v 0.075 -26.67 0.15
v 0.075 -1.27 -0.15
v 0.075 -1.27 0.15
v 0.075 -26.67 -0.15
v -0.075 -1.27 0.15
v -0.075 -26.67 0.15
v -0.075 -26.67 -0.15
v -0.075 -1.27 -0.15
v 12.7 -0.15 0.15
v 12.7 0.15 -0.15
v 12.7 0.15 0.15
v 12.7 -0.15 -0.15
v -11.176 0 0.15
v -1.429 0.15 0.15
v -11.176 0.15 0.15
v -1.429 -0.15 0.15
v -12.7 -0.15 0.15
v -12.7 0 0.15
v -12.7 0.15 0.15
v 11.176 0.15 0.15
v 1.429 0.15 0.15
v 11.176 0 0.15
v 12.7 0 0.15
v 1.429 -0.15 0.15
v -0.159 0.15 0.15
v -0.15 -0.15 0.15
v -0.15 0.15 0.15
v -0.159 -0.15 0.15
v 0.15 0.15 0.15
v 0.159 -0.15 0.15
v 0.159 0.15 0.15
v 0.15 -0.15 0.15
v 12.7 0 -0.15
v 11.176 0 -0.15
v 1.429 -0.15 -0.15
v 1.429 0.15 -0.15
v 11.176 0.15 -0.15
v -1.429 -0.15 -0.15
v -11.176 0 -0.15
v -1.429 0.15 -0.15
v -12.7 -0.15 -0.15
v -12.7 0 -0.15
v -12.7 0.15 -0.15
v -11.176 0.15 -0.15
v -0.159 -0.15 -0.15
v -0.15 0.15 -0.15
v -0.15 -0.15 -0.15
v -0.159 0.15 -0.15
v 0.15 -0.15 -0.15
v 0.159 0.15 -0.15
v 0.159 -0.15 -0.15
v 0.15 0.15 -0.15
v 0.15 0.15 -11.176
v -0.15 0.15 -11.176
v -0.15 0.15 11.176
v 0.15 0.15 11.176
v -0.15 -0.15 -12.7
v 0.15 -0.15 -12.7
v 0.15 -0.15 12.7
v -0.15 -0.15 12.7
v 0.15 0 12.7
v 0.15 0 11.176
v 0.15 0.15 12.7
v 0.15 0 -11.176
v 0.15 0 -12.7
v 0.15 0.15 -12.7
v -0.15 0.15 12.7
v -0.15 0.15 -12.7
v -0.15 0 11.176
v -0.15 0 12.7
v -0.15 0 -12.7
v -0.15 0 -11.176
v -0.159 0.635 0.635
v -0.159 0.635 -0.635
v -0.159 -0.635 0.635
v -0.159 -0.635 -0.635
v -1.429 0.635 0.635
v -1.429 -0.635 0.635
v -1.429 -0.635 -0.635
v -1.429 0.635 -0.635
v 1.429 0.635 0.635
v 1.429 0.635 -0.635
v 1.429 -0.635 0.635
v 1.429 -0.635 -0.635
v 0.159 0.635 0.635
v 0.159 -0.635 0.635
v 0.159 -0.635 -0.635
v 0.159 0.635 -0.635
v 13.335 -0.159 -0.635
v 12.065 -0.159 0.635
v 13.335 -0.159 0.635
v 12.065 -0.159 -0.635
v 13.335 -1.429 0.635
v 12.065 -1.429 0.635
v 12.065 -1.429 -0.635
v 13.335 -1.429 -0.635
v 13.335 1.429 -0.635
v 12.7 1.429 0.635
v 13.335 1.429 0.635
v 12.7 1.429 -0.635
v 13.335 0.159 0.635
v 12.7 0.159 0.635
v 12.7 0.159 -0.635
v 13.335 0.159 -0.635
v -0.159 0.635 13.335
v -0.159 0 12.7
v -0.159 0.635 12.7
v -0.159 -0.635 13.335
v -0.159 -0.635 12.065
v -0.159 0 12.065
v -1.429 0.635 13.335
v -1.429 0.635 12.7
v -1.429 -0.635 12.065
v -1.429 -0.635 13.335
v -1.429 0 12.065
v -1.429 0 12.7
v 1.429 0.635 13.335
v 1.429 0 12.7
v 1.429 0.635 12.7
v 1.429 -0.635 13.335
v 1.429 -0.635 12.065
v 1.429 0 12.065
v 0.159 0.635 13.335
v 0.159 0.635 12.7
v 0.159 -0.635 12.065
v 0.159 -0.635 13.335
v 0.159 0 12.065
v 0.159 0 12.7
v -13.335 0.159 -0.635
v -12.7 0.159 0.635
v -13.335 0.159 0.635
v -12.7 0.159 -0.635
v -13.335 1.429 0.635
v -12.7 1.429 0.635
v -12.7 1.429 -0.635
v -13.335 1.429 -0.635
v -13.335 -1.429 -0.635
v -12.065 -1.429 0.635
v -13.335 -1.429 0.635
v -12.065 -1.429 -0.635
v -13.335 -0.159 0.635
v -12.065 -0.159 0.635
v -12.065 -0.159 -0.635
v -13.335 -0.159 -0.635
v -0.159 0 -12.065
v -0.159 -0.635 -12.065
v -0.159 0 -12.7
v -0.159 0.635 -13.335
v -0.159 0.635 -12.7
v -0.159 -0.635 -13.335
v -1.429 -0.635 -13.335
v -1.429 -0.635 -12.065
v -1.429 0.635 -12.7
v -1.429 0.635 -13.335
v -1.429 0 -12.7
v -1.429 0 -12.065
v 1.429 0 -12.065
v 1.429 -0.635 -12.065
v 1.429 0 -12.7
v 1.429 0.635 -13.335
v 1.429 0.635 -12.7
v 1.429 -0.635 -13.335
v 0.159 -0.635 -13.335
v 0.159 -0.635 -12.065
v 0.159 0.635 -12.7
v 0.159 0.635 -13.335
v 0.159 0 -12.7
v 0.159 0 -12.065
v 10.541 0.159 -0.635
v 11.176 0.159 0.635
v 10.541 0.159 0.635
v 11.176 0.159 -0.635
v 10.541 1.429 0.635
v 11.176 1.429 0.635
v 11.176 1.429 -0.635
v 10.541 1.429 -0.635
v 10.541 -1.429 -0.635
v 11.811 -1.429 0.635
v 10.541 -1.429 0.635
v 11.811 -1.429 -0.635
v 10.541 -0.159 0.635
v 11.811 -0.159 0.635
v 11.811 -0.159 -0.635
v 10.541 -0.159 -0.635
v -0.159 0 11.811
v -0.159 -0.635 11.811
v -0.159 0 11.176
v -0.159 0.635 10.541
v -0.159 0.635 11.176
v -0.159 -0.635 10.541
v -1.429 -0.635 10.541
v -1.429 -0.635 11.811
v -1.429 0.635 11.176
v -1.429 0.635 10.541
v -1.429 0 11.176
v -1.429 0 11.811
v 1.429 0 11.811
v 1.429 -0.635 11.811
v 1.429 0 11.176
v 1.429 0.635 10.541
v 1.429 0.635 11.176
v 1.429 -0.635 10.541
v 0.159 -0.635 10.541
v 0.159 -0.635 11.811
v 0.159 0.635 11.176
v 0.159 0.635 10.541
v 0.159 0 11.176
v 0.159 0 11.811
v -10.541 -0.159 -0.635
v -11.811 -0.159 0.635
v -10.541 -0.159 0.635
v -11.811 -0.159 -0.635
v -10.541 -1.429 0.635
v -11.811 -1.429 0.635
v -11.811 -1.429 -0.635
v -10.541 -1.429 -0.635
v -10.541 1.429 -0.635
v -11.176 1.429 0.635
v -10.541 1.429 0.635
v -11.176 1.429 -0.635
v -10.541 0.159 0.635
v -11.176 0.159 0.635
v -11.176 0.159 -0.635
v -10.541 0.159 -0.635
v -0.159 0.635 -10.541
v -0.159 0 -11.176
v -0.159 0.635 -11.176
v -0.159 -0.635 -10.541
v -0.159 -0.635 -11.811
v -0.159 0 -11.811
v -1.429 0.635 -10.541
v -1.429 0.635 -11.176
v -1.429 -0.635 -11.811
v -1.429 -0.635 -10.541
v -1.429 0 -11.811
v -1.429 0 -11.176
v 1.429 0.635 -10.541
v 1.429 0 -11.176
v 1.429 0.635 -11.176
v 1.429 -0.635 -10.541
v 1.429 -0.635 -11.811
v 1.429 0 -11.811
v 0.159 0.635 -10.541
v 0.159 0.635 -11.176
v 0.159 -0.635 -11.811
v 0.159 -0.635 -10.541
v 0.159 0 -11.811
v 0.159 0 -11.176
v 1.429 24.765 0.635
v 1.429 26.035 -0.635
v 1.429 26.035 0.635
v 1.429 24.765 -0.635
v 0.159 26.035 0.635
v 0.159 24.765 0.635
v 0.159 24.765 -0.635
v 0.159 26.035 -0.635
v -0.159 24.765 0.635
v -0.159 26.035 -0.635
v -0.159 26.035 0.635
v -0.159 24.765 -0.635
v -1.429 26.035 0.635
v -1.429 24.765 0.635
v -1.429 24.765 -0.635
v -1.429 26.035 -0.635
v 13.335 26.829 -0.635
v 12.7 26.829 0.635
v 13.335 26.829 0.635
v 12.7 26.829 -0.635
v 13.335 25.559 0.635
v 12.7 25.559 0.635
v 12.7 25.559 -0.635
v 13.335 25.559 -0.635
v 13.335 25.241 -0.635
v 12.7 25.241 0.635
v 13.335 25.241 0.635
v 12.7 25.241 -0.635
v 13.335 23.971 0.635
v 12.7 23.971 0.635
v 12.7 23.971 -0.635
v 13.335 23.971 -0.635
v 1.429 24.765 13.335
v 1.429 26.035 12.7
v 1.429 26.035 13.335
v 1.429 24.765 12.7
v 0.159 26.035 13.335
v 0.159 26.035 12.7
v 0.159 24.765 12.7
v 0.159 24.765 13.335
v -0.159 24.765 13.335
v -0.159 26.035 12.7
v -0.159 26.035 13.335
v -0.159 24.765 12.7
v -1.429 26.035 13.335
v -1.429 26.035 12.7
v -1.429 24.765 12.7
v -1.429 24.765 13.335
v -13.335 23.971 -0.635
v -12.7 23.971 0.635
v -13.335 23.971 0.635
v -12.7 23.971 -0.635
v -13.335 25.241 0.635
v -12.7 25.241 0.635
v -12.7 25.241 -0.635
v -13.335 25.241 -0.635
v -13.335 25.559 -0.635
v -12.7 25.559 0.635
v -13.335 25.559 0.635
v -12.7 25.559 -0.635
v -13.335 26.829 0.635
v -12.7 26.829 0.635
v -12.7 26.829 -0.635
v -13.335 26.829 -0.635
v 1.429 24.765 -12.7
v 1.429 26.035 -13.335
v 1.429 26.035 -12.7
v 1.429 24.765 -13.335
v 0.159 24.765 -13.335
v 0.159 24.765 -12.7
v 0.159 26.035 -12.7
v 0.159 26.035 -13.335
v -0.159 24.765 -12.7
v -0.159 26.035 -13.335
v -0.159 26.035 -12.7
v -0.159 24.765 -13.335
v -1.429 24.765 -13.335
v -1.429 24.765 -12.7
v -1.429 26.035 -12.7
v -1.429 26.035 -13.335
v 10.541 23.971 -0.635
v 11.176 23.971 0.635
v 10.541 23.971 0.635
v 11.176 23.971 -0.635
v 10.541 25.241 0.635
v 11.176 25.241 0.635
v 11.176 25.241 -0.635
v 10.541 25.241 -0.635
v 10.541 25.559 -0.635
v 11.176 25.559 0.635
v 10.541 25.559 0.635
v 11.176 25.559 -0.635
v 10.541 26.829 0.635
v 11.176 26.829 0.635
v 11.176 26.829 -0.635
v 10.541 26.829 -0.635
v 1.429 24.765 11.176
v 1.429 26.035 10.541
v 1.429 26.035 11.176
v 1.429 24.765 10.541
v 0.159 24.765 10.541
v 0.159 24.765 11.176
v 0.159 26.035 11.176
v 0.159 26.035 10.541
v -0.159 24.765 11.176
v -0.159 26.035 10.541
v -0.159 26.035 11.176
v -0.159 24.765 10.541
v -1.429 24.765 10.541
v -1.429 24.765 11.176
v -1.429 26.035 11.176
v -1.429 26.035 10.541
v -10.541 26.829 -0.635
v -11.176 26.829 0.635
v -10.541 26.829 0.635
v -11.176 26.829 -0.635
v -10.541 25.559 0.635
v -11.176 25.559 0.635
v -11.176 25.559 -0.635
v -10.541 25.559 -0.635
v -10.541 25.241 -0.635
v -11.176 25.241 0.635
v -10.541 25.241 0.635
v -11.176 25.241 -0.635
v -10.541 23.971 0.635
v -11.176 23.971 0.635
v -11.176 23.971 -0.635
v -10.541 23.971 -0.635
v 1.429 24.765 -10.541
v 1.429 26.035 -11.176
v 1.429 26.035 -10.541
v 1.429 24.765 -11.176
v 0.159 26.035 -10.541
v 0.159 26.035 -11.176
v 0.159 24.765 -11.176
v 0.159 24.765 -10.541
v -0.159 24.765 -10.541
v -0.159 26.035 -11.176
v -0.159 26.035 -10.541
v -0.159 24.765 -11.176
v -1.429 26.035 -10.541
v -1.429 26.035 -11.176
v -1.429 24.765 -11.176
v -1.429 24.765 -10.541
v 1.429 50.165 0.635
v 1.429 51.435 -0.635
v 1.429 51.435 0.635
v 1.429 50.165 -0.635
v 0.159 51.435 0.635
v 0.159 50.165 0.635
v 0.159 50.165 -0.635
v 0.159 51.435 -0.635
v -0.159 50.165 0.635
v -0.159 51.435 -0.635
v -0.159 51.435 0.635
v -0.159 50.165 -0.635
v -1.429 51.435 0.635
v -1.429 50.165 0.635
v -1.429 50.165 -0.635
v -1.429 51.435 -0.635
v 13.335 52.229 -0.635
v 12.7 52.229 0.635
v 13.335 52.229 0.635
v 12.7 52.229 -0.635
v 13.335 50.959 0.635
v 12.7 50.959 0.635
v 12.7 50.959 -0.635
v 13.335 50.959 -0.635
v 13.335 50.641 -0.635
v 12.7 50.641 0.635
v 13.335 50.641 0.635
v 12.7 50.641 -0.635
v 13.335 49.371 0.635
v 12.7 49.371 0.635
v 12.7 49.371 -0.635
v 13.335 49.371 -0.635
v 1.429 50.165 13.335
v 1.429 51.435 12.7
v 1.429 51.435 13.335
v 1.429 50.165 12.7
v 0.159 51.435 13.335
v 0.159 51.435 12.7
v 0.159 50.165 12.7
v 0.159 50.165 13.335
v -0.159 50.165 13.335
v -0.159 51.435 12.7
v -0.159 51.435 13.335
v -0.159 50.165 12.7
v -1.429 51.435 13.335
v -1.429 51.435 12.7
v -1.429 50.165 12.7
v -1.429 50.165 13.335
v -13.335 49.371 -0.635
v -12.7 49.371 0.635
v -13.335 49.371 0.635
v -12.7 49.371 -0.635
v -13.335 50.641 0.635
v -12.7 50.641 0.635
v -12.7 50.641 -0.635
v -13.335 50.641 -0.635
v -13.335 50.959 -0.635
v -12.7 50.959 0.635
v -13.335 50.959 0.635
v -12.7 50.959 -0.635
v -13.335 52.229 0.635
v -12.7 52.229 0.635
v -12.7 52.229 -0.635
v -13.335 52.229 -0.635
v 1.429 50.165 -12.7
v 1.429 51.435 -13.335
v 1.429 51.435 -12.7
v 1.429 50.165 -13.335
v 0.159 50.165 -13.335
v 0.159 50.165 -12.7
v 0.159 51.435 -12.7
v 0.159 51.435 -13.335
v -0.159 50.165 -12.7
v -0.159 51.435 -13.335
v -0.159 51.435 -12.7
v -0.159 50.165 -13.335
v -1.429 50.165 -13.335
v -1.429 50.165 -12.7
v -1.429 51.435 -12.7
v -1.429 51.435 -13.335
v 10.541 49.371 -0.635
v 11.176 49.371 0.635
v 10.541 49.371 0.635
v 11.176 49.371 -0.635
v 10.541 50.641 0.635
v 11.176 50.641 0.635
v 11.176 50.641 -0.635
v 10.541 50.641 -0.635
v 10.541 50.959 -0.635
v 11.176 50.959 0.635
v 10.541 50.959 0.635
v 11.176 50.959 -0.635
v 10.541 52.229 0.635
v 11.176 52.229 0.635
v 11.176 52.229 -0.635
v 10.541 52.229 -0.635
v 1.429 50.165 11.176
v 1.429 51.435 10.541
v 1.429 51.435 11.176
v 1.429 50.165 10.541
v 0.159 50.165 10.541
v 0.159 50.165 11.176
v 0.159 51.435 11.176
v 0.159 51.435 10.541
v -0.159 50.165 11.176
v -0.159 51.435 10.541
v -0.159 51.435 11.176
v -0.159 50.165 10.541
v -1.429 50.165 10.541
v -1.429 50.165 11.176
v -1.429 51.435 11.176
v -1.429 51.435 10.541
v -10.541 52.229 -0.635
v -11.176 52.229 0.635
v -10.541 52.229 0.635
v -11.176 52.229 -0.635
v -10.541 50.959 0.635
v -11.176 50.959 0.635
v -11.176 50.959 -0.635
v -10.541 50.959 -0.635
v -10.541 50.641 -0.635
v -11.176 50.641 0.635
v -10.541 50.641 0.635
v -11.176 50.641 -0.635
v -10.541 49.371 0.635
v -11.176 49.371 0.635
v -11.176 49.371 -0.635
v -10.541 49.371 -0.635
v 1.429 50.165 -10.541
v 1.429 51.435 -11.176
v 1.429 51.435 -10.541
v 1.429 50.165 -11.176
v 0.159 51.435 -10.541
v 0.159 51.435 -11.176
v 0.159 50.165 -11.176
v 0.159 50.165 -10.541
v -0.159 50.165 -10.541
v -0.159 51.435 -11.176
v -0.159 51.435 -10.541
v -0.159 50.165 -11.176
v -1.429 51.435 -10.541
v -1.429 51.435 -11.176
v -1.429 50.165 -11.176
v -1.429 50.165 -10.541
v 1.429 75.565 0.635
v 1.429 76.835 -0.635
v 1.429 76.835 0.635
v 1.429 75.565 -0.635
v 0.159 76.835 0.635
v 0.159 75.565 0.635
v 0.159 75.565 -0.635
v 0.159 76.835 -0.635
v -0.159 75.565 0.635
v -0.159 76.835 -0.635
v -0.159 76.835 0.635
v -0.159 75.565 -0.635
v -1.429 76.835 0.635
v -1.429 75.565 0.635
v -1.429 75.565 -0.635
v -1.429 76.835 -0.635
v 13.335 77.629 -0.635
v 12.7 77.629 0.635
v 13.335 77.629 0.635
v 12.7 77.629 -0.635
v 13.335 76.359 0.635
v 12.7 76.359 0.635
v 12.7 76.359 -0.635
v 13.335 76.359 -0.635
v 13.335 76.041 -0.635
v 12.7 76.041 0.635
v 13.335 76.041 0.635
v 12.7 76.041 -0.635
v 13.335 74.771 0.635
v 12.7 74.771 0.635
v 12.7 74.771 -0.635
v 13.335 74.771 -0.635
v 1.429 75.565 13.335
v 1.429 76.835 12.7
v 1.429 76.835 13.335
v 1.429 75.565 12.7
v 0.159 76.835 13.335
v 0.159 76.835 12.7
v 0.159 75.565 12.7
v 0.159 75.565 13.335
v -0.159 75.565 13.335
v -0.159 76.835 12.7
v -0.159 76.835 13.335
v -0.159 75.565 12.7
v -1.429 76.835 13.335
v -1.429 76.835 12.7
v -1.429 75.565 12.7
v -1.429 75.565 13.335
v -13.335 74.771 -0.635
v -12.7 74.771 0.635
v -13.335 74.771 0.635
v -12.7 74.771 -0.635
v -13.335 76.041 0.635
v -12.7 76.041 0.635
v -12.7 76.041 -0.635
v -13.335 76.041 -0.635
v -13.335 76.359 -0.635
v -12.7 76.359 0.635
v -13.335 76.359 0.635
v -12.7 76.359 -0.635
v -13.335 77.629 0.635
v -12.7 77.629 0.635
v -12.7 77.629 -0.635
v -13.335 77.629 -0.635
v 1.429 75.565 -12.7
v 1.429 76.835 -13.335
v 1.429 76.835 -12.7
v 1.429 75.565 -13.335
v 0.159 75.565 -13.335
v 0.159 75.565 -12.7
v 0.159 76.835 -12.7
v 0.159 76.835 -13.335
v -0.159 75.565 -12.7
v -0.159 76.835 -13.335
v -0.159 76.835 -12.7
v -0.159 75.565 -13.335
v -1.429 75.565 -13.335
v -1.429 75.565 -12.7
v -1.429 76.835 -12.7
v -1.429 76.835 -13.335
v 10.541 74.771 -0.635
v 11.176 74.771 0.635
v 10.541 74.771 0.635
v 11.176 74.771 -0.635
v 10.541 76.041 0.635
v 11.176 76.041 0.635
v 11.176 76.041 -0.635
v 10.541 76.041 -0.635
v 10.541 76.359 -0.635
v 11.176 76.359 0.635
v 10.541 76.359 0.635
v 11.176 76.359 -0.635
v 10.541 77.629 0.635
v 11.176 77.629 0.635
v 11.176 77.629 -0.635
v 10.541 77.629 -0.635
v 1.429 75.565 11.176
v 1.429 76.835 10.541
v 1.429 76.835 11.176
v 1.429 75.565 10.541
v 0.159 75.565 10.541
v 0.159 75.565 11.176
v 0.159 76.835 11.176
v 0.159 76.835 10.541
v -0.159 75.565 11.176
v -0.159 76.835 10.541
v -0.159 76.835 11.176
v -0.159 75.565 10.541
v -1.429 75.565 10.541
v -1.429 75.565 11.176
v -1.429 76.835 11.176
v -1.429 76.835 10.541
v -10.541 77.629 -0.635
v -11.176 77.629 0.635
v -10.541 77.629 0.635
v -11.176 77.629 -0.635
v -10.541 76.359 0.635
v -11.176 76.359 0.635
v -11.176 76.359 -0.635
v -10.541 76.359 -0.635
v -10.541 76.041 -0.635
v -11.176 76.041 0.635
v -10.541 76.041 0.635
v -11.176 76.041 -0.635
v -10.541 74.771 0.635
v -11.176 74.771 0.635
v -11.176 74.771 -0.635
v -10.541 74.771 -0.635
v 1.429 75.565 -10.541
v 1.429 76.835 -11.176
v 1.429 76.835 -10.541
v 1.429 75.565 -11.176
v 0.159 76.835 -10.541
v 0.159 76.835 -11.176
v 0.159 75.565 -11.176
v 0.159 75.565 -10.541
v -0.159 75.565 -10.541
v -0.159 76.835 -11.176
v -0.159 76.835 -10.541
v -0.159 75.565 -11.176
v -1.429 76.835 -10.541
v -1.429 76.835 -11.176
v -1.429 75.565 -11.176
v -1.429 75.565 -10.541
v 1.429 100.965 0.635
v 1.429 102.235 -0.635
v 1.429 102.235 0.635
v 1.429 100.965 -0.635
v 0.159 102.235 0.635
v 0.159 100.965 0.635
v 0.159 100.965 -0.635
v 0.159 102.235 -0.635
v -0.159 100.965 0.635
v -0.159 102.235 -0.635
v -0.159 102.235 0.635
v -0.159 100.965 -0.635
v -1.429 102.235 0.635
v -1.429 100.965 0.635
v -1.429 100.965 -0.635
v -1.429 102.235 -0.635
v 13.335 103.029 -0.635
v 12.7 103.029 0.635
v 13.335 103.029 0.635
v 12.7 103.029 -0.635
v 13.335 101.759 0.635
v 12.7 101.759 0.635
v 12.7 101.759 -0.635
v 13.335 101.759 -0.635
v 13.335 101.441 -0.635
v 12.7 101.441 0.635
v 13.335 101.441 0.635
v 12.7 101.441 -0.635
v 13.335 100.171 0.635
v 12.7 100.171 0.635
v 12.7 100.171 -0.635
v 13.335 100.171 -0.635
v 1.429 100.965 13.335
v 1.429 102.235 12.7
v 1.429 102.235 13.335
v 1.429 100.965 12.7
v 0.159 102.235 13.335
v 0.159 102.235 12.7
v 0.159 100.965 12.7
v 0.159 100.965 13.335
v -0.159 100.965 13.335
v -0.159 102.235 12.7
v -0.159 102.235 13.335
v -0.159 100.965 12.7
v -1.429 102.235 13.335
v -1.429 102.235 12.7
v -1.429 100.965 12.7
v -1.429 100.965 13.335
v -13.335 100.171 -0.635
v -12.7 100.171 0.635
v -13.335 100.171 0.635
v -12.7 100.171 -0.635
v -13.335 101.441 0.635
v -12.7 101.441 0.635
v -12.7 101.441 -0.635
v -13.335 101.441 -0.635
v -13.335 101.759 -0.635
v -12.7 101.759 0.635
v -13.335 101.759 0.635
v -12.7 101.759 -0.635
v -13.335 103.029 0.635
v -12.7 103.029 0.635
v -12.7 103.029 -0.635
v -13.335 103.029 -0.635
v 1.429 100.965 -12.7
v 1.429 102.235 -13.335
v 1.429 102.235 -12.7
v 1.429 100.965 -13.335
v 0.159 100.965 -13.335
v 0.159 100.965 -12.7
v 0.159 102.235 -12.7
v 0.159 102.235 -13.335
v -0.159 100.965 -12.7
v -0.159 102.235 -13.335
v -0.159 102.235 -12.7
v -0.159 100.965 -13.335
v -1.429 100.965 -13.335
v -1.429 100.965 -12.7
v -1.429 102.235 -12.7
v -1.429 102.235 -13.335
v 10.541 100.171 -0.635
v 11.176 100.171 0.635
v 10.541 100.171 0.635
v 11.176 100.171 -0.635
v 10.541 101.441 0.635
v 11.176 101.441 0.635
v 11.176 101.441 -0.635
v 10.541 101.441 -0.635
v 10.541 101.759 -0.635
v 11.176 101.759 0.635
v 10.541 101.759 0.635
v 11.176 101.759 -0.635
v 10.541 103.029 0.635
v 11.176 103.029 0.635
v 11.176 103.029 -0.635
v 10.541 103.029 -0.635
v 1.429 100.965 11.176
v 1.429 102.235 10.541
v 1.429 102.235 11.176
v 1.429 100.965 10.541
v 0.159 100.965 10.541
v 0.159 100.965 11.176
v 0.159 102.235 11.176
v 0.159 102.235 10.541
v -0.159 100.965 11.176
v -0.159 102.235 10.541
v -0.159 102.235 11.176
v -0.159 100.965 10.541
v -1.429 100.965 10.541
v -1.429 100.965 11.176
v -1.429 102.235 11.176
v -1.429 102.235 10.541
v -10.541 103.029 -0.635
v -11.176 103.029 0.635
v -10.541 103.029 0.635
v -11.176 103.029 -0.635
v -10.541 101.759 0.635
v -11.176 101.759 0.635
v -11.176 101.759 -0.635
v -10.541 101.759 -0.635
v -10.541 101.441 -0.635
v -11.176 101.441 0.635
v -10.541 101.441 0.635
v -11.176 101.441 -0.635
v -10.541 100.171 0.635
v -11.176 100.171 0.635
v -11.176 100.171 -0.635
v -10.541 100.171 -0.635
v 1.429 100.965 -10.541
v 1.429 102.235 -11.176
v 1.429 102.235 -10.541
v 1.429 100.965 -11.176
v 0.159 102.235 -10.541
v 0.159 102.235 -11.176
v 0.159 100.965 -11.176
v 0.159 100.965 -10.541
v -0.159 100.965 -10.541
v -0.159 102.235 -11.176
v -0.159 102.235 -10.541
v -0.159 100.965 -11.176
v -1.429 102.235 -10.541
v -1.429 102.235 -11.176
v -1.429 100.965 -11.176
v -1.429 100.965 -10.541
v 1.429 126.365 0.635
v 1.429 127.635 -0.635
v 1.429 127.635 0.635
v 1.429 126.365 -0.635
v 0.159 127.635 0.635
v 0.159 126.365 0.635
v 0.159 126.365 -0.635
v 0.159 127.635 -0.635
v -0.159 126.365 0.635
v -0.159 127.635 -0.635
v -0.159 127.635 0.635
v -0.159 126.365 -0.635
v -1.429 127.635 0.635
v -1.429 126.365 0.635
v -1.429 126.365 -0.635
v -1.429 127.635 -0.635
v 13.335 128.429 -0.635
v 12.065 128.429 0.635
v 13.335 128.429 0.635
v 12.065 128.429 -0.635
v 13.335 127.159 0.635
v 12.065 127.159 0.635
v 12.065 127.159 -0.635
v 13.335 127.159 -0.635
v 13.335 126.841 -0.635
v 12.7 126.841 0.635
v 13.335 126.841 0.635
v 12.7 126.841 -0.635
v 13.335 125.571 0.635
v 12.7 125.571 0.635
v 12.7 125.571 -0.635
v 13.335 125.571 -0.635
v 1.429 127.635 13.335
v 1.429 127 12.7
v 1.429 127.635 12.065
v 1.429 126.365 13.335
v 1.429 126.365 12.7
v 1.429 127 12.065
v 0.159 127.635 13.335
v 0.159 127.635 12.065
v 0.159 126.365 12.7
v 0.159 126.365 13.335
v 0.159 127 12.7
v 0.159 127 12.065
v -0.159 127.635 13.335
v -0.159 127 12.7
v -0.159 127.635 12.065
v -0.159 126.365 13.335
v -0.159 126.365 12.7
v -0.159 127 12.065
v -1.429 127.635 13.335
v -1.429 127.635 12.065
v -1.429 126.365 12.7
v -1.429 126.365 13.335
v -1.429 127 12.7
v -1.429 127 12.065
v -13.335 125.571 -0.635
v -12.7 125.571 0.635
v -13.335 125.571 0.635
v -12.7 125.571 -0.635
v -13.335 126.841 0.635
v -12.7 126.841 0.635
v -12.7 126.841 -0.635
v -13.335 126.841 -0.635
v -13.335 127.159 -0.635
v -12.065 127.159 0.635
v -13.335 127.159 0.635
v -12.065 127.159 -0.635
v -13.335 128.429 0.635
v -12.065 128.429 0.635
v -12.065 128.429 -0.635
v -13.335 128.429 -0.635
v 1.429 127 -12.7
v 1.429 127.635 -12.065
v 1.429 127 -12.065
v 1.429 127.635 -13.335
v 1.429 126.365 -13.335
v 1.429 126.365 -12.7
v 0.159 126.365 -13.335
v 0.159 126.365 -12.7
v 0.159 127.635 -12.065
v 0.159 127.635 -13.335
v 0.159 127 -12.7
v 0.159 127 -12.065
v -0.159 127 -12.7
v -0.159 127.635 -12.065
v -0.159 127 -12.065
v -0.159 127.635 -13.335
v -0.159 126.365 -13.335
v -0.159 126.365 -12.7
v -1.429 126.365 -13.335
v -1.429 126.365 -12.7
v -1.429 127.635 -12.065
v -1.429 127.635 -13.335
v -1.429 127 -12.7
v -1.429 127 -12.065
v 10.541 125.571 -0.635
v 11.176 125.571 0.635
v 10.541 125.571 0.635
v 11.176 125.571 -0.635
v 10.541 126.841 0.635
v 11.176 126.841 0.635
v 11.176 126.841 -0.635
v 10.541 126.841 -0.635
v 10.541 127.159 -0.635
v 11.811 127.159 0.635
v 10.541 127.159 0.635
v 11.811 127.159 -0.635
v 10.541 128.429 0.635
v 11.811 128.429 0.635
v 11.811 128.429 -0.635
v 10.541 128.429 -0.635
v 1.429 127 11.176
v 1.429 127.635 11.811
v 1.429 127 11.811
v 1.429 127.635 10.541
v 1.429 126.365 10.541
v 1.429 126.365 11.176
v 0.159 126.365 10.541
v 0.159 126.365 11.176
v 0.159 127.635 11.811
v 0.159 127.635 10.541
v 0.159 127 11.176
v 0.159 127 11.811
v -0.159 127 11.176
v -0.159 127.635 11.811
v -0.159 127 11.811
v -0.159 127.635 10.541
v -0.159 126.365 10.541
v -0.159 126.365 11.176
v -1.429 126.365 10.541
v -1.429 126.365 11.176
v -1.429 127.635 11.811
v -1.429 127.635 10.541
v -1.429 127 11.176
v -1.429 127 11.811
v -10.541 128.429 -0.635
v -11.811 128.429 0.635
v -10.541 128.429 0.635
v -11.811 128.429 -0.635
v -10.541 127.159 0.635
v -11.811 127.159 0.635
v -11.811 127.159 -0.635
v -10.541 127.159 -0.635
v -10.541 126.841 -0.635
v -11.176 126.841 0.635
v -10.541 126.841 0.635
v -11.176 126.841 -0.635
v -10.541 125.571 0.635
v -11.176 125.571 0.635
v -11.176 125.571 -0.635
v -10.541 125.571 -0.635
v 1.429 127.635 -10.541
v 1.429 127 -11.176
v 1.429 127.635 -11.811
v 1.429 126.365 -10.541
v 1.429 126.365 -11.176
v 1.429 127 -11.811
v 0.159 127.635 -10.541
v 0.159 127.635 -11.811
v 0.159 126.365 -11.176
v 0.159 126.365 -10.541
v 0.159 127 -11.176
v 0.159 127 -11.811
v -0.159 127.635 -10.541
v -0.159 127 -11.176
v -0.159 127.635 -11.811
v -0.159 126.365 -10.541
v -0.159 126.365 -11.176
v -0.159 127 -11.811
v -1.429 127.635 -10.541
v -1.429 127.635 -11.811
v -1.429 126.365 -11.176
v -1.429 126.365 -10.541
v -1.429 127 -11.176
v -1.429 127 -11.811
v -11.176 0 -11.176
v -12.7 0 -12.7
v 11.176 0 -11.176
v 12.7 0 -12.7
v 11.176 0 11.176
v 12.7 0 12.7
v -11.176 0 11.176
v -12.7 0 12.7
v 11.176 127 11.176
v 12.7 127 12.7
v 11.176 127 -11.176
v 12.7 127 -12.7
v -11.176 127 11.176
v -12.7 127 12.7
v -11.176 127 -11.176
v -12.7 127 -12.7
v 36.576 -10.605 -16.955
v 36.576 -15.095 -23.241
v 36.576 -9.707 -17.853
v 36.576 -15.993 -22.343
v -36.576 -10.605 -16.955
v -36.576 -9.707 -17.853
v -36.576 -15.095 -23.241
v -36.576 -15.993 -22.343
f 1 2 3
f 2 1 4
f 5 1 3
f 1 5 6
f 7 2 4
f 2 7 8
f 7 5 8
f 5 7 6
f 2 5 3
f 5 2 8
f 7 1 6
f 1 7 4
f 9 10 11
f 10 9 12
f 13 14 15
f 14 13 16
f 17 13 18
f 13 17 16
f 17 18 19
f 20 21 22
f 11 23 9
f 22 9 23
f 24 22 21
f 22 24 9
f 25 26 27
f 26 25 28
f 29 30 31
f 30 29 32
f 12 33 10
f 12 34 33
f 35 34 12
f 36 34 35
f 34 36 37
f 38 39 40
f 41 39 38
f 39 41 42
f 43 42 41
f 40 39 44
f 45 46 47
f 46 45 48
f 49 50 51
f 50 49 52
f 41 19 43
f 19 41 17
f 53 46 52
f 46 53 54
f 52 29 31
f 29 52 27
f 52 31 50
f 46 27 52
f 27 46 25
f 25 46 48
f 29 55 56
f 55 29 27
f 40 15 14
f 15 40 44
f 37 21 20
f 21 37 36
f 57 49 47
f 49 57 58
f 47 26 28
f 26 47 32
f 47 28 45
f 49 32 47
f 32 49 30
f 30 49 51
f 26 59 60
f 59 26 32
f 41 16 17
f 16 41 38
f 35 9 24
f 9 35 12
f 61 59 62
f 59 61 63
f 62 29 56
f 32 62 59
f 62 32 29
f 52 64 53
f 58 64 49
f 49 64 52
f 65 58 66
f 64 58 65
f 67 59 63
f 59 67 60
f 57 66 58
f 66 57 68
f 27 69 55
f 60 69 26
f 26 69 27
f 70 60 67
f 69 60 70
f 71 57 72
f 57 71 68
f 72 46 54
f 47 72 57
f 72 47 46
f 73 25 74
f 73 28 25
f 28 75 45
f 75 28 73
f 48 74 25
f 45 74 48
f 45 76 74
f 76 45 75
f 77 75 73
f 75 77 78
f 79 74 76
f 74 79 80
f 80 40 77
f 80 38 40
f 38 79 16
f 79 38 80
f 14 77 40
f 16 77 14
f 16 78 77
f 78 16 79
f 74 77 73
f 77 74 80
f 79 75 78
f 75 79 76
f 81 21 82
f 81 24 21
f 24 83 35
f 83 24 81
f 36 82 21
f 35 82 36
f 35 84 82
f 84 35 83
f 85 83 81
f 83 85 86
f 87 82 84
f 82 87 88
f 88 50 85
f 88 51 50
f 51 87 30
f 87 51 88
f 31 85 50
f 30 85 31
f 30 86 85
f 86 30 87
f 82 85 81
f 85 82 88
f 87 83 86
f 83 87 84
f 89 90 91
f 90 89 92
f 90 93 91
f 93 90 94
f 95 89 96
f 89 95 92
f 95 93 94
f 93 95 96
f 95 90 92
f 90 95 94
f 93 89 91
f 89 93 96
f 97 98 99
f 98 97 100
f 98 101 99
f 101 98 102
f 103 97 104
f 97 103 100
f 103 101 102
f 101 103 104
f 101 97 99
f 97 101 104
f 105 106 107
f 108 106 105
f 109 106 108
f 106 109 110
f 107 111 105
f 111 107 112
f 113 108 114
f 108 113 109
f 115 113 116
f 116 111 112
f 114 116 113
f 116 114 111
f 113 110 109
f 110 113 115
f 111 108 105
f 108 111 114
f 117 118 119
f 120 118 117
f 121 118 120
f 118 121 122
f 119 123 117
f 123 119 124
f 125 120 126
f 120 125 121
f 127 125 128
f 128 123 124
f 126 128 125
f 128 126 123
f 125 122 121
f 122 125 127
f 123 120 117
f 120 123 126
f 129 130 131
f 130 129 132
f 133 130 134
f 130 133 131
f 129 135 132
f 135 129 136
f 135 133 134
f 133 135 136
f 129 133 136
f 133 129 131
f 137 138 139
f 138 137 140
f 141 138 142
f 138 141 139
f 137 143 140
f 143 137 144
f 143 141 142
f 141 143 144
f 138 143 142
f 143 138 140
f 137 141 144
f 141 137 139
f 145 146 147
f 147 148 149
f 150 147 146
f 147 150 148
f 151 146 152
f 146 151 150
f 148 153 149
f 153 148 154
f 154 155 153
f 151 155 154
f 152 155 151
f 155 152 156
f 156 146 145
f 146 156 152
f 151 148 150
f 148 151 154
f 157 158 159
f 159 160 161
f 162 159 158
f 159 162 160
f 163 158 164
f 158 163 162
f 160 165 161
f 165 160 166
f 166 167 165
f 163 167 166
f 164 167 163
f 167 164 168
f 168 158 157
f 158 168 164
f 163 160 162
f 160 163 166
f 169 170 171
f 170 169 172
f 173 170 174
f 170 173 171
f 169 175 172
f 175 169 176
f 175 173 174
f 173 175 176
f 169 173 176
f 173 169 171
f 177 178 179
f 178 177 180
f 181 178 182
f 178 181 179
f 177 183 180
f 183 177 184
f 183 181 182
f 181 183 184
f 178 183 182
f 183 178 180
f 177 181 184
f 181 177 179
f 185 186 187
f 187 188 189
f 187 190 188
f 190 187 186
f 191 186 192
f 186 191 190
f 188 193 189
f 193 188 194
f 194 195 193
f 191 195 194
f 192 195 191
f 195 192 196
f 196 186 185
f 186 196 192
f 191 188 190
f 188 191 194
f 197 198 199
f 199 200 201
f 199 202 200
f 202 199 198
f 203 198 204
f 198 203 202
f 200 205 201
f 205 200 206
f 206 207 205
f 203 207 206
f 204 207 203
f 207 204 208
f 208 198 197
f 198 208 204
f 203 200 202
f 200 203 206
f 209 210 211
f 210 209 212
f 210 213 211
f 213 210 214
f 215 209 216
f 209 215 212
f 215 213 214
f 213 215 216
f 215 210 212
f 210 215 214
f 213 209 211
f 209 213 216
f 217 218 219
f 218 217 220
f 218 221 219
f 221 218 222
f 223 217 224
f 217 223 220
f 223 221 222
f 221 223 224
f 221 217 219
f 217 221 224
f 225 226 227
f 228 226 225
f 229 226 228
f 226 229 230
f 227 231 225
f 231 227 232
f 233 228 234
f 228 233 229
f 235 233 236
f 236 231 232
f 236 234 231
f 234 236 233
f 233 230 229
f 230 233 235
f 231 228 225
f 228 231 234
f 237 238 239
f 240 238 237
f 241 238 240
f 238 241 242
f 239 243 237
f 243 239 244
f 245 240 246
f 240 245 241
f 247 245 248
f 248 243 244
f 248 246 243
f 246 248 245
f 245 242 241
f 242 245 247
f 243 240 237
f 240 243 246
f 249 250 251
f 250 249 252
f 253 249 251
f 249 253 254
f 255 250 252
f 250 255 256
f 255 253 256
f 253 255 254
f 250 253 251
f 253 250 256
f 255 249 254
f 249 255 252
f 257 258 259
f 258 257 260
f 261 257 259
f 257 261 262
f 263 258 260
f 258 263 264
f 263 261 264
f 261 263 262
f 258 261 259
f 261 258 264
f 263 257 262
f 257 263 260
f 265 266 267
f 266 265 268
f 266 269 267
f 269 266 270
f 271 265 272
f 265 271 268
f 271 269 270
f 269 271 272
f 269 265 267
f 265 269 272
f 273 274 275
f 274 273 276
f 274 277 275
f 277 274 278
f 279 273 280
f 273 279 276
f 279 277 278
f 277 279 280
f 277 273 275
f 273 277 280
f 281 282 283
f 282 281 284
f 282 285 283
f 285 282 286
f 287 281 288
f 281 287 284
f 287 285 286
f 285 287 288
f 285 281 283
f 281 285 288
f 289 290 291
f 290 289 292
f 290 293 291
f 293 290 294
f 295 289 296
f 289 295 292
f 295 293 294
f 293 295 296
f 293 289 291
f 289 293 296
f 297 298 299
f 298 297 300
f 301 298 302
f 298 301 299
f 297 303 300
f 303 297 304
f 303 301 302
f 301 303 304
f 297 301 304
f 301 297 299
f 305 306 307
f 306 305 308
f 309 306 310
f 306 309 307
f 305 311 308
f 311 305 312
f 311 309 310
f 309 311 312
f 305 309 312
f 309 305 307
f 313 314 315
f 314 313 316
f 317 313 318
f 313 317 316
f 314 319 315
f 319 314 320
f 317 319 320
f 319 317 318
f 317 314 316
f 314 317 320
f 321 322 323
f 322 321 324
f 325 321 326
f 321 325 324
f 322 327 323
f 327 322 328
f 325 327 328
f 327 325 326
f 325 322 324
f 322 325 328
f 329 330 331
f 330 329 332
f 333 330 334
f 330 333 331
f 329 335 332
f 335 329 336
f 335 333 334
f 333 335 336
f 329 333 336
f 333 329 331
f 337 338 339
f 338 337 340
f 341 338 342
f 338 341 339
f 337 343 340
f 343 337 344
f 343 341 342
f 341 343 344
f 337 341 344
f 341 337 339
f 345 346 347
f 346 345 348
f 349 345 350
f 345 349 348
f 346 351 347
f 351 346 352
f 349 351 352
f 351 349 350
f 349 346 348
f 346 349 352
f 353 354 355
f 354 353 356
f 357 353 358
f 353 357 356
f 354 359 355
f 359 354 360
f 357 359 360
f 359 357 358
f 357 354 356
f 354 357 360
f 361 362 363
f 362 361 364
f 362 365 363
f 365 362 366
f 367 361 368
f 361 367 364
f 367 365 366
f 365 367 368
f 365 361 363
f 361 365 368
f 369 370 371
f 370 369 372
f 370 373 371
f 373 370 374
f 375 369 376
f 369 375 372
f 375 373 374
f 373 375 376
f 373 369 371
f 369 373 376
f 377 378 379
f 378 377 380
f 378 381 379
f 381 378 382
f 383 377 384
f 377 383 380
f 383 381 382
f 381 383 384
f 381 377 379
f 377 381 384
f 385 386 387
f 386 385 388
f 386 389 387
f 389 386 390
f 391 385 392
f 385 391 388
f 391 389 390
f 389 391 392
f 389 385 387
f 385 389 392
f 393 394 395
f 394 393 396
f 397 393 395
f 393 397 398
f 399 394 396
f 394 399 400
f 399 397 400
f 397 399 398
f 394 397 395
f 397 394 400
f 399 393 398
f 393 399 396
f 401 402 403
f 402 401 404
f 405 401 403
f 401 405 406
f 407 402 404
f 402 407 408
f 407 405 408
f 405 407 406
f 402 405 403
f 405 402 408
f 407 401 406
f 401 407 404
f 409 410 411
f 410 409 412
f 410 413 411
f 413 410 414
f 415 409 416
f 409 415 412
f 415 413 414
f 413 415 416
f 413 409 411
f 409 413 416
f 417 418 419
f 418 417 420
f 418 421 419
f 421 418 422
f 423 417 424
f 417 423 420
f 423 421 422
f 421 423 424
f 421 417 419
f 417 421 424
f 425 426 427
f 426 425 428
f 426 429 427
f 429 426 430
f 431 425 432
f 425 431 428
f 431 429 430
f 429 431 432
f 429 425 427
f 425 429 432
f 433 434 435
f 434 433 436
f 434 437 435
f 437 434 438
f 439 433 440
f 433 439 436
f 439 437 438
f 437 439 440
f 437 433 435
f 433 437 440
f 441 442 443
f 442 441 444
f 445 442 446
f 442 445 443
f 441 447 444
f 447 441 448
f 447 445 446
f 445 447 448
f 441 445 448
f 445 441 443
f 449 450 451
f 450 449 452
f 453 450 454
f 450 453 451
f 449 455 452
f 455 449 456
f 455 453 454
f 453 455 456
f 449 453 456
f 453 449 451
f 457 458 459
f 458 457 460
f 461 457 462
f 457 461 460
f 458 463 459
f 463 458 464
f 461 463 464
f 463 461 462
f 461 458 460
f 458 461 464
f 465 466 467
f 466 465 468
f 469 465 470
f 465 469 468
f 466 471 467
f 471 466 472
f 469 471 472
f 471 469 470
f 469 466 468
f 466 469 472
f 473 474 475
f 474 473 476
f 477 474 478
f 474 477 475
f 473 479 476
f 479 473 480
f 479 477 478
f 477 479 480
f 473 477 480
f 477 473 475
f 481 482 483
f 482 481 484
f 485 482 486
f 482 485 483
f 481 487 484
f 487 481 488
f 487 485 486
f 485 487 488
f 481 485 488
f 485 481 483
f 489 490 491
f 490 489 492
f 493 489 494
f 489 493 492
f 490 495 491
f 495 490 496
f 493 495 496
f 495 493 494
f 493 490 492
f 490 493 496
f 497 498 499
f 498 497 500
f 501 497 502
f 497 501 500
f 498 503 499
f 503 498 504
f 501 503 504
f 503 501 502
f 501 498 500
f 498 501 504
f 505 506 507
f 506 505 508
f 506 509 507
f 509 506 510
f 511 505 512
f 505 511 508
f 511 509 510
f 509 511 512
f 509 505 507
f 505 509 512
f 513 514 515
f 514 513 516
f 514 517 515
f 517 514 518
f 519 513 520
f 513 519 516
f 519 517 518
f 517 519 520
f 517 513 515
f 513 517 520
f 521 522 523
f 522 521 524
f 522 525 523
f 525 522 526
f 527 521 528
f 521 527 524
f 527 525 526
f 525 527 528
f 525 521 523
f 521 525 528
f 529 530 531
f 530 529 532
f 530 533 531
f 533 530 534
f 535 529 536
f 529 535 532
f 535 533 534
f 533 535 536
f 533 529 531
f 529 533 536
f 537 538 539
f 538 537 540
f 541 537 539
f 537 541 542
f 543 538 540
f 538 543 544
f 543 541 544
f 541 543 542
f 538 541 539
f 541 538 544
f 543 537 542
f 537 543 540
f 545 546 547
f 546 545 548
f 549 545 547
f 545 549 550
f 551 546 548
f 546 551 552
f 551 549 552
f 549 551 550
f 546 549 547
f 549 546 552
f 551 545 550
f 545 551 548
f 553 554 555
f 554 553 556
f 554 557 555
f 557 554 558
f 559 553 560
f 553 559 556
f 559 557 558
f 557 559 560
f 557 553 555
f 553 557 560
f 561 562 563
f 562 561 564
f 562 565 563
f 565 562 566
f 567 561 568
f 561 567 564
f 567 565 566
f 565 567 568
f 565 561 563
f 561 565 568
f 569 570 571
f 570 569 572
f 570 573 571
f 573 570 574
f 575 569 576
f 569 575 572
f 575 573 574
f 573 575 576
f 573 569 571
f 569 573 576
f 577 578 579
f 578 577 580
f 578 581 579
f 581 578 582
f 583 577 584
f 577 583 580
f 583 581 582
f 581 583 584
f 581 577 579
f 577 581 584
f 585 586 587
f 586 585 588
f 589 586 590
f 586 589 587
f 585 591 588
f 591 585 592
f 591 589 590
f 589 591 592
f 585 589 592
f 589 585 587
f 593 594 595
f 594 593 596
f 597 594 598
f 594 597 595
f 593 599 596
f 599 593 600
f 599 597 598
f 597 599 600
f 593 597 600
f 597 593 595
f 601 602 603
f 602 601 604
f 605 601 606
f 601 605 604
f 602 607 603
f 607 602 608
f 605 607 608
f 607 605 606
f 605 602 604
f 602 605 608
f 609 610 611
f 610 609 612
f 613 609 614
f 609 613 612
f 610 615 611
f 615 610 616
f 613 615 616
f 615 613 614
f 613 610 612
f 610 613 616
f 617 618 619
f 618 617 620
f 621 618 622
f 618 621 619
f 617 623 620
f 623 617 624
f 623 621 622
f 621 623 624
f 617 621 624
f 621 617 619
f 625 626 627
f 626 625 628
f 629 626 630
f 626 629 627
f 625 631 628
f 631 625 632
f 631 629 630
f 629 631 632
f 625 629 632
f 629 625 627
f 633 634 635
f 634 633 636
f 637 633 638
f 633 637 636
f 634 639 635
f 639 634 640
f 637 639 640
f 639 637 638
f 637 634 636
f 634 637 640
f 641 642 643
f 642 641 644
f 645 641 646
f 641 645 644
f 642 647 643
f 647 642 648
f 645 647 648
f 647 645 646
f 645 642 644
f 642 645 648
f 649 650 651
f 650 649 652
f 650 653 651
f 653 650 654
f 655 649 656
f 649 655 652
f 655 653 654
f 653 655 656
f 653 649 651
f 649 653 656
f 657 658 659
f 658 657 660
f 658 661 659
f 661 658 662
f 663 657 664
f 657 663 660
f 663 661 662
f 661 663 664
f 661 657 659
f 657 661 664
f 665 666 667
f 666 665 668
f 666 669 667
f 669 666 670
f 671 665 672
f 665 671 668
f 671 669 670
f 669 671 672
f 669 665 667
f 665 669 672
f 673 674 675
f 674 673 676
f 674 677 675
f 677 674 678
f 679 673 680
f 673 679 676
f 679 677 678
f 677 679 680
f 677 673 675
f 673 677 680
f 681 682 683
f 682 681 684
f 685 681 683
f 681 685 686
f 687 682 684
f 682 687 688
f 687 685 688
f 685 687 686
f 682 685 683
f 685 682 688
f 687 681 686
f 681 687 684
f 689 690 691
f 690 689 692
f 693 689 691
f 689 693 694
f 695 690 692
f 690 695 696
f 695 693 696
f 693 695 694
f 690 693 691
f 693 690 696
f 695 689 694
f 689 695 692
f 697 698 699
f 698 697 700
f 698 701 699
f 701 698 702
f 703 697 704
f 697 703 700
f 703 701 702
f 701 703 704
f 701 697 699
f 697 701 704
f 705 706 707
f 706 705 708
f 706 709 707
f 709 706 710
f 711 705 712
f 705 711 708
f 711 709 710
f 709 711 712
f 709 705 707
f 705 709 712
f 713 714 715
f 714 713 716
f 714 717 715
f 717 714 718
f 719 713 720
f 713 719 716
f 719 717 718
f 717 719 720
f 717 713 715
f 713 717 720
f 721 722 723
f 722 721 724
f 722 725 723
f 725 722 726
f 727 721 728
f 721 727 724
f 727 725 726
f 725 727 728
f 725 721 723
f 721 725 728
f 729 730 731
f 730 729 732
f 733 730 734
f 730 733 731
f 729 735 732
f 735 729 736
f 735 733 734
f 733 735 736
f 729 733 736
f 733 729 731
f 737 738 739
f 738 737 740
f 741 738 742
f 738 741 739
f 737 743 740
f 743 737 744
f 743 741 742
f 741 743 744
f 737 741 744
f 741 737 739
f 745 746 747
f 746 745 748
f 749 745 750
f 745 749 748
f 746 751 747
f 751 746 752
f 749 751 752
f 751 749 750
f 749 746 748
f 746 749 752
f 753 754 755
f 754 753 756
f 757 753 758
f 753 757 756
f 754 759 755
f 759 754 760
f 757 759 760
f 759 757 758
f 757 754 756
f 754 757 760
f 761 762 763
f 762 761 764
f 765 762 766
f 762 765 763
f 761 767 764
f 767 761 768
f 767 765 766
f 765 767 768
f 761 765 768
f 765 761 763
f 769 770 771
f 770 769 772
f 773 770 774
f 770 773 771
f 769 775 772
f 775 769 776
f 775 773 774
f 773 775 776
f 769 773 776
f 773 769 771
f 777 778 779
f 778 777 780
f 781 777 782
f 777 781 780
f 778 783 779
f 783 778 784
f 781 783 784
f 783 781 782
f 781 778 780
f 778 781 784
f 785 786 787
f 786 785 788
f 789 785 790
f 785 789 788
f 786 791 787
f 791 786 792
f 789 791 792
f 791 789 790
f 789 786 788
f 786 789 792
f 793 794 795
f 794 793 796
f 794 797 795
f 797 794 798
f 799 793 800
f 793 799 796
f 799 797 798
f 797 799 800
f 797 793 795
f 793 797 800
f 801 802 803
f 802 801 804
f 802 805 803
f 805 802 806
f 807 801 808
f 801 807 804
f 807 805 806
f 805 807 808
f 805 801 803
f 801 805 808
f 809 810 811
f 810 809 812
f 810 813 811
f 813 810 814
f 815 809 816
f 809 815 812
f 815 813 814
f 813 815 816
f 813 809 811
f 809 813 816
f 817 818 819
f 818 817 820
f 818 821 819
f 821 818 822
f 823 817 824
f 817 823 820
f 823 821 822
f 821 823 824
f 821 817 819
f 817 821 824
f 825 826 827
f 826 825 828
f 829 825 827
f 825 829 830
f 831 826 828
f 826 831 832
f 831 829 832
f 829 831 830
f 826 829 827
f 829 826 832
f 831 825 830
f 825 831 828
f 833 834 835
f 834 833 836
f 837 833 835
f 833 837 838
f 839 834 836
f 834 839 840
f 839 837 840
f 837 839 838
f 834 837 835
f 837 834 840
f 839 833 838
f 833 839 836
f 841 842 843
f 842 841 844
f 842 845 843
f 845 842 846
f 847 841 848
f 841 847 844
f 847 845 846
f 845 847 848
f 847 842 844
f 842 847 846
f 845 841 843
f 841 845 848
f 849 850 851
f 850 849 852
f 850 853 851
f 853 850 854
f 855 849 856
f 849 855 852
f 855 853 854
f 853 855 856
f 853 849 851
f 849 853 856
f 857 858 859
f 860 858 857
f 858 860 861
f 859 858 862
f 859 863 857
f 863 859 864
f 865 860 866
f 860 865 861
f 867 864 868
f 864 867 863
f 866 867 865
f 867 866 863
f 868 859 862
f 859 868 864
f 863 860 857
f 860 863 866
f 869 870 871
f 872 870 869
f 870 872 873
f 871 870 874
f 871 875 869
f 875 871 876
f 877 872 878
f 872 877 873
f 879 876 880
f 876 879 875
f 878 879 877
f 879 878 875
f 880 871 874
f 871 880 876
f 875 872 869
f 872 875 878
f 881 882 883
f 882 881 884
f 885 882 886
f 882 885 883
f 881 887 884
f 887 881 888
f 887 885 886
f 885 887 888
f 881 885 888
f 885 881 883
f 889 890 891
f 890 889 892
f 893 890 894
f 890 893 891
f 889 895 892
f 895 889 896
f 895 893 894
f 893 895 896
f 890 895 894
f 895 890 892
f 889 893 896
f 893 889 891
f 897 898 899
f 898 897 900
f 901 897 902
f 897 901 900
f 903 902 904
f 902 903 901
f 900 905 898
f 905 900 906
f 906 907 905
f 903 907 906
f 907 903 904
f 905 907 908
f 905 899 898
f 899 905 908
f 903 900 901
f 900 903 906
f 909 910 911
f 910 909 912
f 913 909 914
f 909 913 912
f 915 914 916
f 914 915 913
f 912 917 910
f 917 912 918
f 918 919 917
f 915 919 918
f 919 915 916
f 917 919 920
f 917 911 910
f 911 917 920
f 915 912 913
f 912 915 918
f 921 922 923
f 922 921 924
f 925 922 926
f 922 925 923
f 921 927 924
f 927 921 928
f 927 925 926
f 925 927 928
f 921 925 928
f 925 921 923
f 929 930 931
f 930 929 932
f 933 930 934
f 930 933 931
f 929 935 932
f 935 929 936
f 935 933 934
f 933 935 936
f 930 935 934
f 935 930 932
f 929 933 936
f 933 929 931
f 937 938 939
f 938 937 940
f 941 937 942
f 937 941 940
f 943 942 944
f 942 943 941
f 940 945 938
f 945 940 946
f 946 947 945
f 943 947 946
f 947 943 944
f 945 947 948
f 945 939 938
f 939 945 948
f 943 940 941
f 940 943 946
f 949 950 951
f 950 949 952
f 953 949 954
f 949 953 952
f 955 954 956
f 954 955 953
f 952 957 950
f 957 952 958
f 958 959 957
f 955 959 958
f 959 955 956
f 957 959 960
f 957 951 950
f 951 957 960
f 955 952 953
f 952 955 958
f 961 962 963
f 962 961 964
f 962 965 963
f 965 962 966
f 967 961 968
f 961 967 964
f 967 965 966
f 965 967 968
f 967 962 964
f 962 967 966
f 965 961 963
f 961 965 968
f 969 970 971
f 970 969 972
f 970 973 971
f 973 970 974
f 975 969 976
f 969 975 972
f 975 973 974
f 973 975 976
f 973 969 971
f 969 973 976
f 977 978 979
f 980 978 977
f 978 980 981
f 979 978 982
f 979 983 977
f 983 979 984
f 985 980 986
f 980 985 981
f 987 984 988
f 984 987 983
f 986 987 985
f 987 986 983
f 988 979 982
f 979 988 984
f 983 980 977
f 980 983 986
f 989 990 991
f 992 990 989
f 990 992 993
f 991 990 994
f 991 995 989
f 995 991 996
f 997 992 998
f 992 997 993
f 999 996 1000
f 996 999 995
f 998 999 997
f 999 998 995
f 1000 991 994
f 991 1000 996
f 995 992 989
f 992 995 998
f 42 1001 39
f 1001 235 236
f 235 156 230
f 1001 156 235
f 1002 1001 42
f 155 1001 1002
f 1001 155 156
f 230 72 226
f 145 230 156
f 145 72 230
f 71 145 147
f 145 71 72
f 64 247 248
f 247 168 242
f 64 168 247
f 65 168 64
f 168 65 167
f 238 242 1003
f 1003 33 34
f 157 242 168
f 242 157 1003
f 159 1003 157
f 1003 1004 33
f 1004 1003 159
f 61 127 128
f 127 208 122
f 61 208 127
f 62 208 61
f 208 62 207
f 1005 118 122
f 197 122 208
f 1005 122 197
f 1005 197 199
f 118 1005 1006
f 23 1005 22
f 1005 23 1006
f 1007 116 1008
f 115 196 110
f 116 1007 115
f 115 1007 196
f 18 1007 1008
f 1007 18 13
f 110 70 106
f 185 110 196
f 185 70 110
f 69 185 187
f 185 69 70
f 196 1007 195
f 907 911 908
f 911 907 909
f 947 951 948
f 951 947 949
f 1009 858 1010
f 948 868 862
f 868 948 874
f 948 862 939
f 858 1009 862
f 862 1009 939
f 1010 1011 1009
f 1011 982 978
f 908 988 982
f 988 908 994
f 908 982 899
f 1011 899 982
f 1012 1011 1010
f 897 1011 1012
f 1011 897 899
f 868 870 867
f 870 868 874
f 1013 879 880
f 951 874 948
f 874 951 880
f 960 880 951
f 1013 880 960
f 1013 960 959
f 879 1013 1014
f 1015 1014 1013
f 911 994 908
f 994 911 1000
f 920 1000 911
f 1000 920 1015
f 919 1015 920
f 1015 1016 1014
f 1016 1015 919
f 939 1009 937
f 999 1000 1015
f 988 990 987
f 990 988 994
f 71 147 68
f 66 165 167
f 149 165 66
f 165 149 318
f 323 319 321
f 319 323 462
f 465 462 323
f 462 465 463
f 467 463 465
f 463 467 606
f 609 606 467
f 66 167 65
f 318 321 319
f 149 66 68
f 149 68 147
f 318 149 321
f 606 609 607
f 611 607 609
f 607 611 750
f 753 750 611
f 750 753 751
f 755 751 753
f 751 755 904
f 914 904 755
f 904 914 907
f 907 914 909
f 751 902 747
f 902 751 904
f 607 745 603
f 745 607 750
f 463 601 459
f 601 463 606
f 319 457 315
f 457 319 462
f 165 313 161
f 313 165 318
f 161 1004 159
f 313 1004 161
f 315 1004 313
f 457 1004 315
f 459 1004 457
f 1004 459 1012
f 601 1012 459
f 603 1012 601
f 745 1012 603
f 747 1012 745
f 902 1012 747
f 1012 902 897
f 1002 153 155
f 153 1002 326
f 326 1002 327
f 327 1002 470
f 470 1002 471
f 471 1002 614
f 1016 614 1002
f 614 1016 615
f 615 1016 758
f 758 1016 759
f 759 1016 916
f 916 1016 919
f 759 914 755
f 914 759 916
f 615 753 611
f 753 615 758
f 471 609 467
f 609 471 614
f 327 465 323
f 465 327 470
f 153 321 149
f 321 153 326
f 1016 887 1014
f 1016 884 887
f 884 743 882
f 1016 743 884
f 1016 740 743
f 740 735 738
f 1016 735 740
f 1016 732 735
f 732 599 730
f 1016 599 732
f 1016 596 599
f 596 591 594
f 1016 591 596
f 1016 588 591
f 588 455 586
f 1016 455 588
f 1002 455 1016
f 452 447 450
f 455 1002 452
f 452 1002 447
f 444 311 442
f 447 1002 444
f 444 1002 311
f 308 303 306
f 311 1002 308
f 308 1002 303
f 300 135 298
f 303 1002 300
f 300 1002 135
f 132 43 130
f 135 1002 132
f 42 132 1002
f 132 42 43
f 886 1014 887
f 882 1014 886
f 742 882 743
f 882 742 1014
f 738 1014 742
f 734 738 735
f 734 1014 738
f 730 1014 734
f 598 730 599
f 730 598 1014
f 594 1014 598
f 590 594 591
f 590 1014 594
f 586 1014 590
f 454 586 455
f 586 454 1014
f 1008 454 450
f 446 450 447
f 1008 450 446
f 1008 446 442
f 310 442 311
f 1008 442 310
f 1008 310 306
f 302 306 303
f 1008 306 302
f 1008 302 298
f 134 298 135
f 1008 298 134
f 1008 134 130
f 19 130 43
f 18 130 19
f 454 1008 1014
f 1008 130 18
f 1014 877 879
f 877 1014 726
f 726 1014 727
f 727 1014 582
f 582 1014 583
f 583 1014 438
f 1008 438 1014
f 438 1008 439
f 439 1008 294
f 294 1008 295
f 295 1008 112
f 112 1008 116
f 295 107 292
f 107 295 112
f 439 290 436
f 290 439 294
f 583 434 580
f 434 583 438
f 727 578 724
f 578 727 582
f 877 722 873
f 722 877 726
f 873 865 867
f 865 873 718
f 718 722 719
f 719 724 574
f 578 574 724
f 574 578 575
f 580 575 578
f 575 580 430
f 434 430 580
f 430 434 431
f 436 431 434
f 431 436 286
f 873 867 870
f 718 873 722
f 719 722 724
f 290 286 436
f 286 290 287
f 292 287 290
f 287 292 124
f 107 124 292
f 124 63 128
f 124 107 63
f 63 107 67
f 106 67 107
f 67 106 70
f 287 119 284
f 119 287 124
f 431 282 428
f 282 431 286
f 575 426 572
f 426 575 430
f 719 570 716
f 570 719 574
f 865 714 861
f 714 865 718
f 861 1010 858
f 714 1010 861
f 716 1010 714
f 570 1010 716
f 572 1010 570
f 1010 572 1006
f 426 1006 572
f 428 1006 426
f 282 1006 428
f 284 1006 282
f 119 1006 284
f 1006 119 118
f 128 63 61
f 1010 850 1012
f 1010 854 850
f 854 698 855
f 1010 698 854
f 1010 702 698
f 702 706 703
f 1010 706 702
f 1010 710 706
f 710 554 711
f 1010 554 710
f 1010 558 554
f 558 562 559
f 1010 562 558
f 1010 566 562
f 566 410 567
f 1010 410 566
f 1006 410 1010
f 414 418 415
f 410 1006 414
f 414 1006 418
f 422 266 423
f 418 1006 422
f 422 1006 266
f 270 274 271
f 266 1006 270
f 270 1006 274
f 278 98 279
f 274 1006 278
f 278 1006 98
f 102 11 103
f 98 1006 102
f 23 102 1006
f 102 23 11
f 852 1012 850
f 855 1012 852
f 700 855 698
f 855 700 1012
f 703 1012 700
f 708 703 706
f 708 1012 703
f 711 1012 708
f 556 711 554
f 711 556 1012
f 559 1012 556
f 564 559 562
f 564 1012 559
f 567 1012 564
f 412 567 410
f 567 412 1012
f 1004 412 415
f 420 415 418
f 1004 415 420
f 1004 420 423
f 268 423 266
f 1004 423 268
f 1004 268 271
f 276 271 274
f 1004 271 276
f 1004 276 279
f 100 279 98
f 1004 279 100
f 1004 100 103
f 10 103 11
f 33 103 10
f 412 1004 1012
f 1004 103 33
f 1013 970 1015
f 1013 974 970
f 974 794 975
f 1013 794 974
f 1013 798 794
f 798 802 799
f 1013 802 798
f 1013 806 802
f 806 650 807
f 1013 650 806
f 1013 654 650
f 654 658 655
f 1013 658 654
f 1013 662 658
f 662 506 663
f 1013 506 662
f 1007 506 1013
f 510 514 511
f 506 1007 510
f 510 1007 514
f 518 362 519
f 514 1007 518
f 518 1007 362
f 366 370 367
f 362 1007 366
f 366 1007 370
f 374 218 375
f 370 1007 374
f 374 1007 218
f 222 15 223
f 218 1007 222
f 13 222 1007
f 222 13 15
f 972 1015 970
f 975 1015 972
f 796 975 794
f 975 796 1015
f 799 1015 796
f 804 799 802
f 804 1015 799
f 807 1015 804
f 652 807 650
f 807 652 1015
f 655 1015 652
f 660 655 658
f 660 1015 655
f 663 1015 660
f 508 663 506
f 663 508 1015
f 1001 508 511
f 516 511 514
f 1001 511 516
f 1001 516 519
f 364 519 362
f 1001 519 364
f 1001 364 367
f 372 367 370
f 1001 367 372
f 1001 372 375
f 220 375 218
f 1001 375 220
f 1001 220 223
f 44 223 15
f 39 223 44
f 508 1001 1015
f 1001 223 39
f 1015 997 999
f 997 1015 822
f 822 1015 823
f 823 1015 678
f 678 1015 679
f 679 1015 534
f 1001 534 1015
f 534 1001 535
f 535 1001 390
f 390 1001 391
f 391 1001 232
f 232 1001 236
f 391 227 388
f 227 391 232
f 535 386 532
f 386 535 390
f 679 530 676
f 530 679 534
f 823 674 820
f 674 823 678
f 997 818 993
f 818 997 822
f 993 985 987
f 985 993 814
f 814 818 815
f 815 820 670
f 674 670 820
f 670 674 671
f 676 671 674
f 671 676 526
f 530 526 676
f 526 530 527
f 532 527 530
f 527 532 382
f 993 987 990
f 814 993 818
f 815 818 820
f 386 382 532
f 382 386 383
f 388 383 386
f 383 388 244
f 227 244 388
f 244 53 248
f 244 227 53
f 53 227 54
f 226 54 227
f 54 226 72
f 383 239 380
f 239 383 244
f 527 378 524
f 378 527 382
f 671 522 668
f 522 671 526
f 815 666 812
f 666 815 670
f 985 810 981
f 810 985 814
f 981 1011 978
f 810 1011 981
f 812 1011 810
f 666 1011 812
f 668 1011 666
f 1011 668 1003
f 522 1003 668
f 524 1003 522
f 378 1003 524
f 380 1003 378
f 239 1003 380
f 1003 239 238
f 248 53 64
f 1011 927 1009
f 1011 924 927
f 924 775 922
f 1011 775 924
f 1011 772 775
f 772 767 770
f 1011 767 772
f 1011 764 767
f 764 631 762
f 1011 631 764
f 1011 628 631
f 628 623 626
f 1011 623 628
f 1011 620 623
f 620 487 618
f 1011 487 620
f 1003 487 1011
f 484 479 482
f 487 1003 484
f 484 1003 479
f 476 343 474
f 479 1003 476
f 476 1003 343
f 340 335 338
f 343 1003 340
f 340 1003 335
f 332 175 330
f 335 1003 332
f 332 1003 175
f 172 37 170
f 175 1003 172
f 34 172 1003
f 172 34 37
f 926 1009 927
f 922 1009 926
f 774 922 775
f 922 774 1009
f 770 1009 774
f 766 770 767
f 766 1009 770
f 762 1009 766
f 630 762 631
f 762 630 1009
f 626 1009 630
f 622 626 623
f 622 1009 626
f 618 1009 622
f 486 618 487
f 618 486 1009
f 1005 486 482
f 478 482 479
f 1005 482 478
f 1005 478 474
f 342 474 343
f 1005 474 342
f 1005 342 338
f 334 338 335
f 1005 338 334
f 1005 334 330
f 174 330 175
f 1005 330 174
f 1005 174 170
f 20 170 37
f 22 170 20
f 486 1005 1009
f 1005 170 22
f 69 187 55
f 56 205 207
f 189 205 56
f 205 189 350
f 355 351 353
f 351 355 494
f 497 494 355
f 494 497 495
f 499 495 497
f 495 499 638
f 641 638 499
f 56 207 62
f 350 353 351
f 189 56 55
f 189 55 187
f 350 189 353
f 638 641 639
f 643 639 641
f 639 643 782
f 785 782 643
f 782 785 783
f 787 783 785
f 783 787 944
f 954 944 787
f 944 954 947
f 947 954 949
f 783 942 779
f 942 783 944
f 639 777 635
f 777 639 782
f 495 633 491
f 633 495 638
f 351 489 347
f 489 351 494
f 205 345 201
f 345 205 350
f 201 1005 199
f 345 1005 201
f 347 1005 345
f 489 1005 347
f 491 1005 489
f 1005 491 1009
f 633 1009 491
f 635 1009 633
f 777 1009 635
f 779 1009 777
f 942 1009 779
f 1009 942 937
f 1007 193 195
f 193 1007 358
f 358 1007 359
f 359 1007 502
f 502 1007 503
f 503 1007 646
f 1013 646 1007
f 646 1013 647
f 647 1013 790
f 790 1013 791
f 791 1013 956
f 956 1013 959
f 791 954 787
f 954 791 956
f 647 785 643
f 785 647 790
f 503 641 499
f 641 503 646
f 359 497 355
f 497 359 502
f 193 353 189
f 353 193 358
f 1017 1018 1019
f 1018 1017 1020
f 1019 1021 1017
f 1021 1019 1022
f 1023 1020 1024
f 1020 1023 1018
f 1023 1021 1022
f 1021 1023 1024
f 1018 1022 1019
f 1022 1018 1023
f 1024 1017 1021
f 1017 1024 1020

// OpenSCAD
include <../mo/mo.scad>


SectionPositionCount = 9;

// Spec[ 0 ] = length
// Spec[ 1 ] = Width
// Spec[ 2 ] = Height
// Spec[ 3 ] = Thickness
// Spec[ 4 ] = position spacing

// Pos[ 0 ] = section
// Pos[ 1 ] = position index


module moRectangularTube( spec, p = [ 0, 0 ], info = false ) {
  color( Aluminum ) {
    moPitch( 3 ) {
      linear_extrude( height = spec[ 0 ] ) {
        difference() {
          square( [ spec[ 1 ], spec[ 2 ] ], center = true );
          square( [ spec[ 1 ] - 2 * spec[ 3 ], spec[ 2 ] - 2 * spec[ 3 ] ], center = true );
        }
      }
    }
  }
  
    
  if ( info ) {
    moPartOrigin();
    for ( i = [ 0 : spec[ 0 ] / spec[ 4 ] ] )
      for ( j = [ 0 : SectionPositionCount - 1 ] ) {
        pi = [ i, j ];
        moMoveTo( moRectangularTubePosition( pi, spec ) )
          moPosition2( pi );
      }
  }
  
  if ( $name )
    moPartLabel( parent_module( 1 ) );
}


function moRectangularTubePositionSection( s, w, h, t ) = ( s == 0 ) ? [ [ 0, 0, 0 ], [ 0, 0, 1 ], 0 ] :
                                                            ( s == 1 ) ? [ [ w/2, 0, 0 ], [ 0, 0, 1 ], 90 ] :
                                                            ( s == 2 ) ? [ [ 0, 0, h/2 ], [ 1, 0, 0 ], -90 ] :
                                                            ( s == 3 ) ? [ [ -w/2, 0, 0 ], [ 0, 0, 1 ], -90 ] :
                                                            ( s == 4 ) ? [ [ 0, 0, -h/2 ], [ 1, 0, 0 ], 90 ] :
                                                            ( s == 5 ) ? [ [ w/2 - t, 0, 0 ], [ 0, 0, 1 ], -90 ] :
                                                            ( s == 6 ) ? [ [ 0, 0, h/2 - t ], [ 1, 0, 0 ], 90 ] :
                                                            ( s == 7 ) ? [ [ -w/2 + t, 0, 0 ], [ 0, 0, 1 ], 90 ] :
                                                             [ [ 0, 0, -h/2 + t ], [ 1, 0, 0 ], -90 ];


function moRectangularTubePosition( p = [0, 0 ], spec ) = moMoveToPosition( [ [ 0, p[0]*spec[4], 0 ], [ 1, 0, 0 ], 0 ], moRectangularTubePositionSection( p[ 1 ], spec[ 1 ], spec[ 2 ], spec[ 3 ] ) ); 


demoSpec = [ 5 * in, 1 * in, 1 * in, 0.06 * in, 1 * in ];

moMoveOriginTo( moRectangularTubePosition( [ 0, 0 ], demoSpec ) )
  moRectangularTube( demoSpec, [ 0 , 0 ], info = true, $name=true );
